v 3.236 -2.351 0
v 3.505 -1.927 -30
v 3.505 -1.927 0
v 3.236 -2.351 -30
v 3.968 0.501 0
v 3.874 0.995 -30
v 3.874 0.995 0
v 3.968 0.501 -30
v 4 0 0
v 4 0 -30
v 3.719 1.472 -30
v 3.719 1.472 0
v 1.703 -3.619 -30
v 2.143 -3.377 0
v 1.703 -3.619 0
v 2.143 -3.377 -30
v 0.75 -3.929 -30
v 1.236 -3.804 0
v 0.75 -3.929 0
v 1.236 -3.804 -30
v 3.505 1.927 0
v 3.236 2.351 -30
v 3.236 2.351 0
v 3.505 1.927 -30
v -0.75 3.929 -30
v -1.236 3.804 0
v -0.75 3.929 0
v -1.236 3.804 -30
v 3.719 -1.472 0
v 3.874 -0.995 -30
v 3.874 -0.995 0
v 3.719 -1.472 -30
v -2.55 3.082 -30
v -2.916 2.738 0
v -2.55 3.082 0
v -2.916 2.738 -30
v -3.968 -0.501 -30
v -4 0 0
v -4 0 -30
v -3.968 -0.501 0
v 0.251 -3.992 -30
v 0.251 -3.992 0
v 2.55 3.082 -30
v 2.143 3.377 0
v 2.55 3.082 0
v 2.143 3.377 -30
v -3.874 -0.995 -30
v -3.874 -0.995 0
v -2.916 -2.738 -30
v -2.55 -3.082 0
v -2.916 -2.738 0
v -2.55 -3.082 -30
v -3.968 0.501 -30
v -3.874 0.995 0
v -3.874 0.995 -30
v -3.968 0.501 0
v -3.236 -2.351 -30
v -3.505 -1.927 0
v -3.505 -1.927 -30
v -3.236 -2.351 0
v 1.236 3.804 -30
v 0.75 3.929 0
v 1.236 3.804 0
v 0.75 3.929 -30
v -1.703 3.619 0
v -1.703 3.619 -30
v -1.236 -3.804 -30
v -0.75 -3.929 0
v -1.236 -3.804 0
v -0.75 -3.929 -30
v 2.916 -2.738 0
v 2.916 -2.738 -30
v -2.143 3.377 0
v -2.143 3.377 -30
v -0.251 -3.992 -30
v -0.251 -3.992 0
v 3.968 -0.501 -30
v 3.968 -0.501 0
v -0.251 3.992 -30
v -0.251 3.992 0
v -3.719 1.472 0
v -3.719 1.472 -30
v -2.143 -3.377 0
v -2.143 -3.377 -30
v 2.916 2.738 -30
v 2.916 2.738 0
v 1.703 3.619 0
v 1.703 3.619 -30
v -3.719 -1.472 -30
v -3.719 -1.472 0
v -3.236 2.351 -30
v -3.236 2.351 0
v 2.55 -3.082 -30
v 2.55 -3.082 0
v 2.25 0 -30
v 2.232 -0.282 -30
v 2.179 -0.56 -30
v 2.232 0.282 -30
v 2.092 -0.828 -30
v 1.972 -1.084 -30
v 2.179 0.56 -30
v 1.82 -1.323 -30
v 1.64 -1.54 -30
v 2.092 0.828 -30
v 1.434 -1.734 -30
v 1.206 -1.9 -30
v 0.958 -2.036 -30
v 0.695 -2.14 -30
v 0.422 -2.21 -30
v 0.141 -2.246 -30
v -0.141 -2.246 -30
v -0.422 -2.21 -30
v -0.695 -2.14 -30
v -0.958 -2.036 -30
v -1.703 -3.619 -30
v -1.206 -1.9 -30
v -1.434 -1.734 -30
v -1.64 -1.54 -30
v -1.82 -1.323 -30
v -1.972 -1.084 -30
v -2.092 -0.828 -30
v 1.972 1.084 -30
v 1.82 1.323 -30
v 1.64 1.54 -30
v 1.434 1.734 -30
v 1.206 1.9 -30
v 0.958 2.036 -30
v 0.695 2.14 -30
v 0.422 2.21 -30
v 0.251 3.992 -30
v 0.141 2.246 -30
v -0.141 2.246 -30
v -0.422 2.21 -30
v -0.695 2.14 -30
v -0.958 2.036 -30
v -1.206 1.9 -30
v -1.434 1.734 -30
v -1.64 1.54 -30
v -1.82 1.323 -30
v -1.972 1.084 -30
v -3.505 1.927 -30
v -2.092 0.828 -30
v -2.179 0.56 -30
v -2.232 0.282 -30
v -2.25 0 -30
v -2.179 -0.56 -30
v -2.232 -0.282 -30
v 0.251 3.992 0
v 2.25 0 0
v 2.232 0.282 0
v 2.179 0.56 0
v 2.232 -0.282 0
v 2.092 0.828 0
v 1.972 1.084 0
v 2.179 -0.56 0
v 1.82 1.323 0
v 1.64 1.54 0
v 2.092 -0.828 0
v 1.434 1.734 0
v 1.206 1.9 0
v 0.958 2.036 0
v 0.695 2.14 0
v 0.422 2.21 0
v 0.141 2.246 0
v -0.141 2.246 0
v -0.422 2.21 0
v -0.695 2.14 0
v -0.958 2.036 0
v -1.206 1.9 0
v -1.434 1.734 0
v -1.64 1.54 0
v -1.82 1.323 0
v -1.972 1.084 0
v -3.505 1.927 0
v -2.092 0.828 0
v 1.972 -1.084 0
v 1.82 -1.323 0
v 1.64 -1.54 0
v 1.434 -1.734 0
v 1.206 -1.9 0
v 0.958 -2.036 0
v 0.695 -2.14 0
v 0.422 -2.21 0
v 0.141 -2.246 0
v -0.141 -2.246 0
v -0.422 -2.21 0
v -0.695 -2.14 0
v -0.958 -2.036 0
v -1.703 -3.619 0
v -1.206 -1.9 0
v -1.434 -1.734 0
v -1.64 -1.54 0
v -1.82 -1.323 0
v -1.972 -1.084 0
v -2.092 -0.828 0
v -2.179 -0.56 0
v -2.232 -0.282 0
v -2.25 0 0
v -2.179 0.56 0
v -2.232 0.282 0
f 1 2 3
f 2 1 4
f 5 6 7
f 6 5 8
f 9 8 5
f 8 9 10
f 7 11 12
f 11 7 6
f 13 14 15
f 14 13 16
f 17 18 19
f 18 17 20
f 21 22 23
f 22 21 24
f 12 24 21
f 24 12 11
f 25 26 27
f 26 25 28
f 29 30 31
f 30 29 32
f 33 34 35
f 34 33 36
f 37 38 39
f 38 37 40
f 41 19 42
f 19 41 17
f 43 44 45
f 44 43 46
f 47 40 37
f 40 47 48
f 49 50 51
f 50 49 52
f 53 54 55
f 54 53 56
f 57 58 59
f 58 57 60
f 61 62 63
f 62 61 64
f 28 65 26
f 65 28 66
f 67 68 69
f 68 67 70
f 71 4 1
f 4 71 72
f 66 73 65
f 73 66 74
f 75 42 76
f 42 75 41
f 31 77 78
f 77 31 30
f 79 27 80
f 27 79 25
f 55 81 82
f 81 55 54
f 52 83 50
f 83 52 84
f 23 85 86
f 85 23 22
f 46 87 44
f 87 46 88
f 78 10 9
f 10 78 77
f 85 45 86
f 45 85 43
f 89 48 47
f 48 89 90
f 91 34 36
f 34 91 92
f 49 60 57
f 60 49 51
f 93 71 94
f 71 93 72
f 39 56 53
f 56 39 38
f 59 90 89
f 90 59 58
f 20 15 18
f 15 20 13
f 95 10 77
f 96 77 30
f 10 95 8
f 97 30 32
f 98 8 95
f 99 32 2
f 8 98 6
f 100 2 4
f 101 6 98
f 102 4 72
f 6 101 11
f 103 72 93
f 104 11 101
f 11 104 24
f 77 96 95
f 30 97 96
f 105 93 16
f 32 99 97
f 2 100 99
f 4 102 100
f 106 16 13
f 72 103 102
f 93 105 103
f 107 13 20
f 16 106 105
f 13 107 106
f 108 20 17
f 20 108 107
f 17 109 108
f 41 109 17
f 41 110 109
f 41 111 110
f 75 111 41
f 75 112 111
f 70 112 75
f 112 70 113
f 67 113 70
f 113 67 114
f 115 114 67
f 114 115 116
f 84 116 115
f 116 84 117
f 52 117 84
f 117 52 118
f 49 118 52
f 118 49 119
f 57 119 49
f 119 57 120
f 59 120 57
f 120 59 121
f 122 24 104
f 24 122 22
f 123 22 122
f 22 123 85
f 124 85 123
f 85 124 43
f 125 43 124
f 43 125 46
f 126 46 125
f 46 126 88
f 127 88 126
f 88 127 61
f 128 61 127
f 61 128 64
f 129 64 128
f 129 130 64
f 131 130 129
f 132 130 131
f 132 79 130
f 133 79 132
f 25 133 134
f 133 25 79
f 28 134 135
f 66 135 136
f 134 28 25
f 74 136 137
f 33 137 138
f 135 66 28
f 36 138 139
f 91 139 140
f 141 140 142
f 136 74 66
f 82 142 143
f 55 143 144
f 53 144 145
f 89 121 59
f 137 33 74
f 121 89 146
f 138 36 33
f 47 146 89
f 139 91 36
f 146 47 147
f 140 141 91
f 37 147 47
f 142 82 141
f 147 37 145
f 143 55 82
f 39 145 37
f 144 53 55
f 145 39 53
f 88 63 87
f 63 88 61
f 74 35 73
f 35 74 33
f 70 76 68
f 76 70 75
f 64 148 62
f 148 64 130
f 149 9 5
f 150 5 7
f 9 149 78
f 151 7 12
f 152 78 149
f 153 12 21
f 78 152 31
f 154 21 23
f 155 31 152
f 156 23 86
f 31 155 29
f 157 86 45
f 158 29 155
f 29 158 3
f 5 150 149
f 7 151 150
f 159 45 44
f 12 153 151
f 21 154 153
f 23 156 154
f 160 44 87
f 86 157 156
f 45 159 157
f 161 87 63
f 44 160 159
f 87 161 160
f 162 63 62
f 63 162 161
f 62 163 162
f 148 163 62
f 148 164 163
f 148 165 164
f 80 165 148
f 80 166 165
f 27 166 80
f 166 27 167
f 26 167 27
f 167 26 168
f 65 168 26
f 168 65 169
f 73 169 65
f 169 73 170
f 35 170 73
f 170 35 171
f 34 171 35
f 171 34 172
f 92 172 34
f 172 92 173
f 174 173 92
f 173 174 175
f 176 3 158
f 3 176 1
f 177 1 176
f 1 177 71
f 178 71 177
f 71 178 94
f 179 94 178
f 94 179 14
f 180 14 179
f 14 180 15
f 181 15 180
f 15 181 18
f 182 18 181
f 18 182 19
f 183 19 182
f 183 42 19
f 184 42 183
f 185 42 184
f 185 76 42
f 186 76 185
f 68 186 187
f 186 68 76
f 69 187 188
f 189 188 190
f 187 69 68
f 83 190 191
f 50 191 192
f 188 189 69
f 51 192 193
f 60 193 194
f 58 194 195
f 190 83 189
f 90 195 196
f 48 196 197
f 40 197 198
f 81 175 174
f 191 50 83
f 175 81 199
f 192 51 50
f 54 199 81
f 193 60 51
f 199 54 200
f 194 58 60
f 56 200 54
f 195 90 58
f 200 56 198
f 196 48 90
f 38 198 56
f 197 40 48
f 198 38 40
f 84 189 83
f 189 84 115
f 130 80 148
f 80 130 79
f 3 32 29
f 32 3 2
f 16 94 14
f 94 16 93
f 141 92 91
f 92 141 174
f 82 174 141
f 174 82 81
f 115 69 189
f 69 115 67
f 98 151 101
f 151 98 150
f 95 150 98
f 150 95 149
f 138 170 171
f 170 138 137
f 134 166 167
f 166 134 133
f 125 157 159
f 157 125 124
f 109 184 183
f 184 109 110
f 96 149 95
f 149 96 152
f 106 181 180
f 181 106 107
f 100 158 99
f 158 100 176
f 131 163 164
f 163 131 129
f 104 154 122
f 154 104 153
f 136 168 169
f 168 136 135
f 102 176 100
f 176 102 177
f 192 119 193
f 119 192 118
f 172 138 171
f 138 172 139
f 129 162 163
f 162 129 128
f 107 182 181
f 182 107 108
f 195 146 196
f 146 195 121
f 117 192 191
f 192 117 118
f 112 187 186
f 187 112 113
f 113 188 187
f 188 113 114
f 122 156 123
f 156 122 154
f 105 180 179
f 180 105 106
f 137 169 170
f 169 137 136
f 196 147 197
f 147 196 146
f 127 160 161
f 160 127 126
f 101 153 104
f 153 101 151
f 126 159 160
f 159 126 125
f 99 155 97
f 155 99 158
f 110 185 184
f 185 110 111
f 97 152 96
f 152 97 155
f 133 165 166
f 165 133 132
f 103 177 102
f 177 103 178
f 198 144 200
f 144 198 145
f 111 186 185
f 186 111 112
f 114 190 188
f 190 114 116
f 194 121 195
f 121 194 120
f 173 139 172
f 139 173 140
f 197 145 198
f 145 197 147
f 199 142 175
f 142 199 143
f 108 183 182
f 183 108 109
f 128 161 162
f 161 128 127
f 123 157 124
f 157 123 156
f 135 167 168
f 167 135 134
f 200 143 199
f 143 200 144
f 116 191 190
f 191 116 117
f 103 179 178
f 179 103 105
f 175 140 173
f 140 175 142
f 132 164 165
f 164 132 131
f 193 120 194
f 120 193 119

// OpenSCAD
$fn = 50;


difference() {
	union() {
		translate(v = [0, 0, -30.0000000000]) {
			cylinder(h = 30, r = 4.0000000000);
		}
		cylinder(h = 0, r = 7.0000000000);
	}
	union() {
		#translate(v = [0, 0, -30]) {
			cylinder(h = 30, r = 2.2500000000);
		}
	}
}
